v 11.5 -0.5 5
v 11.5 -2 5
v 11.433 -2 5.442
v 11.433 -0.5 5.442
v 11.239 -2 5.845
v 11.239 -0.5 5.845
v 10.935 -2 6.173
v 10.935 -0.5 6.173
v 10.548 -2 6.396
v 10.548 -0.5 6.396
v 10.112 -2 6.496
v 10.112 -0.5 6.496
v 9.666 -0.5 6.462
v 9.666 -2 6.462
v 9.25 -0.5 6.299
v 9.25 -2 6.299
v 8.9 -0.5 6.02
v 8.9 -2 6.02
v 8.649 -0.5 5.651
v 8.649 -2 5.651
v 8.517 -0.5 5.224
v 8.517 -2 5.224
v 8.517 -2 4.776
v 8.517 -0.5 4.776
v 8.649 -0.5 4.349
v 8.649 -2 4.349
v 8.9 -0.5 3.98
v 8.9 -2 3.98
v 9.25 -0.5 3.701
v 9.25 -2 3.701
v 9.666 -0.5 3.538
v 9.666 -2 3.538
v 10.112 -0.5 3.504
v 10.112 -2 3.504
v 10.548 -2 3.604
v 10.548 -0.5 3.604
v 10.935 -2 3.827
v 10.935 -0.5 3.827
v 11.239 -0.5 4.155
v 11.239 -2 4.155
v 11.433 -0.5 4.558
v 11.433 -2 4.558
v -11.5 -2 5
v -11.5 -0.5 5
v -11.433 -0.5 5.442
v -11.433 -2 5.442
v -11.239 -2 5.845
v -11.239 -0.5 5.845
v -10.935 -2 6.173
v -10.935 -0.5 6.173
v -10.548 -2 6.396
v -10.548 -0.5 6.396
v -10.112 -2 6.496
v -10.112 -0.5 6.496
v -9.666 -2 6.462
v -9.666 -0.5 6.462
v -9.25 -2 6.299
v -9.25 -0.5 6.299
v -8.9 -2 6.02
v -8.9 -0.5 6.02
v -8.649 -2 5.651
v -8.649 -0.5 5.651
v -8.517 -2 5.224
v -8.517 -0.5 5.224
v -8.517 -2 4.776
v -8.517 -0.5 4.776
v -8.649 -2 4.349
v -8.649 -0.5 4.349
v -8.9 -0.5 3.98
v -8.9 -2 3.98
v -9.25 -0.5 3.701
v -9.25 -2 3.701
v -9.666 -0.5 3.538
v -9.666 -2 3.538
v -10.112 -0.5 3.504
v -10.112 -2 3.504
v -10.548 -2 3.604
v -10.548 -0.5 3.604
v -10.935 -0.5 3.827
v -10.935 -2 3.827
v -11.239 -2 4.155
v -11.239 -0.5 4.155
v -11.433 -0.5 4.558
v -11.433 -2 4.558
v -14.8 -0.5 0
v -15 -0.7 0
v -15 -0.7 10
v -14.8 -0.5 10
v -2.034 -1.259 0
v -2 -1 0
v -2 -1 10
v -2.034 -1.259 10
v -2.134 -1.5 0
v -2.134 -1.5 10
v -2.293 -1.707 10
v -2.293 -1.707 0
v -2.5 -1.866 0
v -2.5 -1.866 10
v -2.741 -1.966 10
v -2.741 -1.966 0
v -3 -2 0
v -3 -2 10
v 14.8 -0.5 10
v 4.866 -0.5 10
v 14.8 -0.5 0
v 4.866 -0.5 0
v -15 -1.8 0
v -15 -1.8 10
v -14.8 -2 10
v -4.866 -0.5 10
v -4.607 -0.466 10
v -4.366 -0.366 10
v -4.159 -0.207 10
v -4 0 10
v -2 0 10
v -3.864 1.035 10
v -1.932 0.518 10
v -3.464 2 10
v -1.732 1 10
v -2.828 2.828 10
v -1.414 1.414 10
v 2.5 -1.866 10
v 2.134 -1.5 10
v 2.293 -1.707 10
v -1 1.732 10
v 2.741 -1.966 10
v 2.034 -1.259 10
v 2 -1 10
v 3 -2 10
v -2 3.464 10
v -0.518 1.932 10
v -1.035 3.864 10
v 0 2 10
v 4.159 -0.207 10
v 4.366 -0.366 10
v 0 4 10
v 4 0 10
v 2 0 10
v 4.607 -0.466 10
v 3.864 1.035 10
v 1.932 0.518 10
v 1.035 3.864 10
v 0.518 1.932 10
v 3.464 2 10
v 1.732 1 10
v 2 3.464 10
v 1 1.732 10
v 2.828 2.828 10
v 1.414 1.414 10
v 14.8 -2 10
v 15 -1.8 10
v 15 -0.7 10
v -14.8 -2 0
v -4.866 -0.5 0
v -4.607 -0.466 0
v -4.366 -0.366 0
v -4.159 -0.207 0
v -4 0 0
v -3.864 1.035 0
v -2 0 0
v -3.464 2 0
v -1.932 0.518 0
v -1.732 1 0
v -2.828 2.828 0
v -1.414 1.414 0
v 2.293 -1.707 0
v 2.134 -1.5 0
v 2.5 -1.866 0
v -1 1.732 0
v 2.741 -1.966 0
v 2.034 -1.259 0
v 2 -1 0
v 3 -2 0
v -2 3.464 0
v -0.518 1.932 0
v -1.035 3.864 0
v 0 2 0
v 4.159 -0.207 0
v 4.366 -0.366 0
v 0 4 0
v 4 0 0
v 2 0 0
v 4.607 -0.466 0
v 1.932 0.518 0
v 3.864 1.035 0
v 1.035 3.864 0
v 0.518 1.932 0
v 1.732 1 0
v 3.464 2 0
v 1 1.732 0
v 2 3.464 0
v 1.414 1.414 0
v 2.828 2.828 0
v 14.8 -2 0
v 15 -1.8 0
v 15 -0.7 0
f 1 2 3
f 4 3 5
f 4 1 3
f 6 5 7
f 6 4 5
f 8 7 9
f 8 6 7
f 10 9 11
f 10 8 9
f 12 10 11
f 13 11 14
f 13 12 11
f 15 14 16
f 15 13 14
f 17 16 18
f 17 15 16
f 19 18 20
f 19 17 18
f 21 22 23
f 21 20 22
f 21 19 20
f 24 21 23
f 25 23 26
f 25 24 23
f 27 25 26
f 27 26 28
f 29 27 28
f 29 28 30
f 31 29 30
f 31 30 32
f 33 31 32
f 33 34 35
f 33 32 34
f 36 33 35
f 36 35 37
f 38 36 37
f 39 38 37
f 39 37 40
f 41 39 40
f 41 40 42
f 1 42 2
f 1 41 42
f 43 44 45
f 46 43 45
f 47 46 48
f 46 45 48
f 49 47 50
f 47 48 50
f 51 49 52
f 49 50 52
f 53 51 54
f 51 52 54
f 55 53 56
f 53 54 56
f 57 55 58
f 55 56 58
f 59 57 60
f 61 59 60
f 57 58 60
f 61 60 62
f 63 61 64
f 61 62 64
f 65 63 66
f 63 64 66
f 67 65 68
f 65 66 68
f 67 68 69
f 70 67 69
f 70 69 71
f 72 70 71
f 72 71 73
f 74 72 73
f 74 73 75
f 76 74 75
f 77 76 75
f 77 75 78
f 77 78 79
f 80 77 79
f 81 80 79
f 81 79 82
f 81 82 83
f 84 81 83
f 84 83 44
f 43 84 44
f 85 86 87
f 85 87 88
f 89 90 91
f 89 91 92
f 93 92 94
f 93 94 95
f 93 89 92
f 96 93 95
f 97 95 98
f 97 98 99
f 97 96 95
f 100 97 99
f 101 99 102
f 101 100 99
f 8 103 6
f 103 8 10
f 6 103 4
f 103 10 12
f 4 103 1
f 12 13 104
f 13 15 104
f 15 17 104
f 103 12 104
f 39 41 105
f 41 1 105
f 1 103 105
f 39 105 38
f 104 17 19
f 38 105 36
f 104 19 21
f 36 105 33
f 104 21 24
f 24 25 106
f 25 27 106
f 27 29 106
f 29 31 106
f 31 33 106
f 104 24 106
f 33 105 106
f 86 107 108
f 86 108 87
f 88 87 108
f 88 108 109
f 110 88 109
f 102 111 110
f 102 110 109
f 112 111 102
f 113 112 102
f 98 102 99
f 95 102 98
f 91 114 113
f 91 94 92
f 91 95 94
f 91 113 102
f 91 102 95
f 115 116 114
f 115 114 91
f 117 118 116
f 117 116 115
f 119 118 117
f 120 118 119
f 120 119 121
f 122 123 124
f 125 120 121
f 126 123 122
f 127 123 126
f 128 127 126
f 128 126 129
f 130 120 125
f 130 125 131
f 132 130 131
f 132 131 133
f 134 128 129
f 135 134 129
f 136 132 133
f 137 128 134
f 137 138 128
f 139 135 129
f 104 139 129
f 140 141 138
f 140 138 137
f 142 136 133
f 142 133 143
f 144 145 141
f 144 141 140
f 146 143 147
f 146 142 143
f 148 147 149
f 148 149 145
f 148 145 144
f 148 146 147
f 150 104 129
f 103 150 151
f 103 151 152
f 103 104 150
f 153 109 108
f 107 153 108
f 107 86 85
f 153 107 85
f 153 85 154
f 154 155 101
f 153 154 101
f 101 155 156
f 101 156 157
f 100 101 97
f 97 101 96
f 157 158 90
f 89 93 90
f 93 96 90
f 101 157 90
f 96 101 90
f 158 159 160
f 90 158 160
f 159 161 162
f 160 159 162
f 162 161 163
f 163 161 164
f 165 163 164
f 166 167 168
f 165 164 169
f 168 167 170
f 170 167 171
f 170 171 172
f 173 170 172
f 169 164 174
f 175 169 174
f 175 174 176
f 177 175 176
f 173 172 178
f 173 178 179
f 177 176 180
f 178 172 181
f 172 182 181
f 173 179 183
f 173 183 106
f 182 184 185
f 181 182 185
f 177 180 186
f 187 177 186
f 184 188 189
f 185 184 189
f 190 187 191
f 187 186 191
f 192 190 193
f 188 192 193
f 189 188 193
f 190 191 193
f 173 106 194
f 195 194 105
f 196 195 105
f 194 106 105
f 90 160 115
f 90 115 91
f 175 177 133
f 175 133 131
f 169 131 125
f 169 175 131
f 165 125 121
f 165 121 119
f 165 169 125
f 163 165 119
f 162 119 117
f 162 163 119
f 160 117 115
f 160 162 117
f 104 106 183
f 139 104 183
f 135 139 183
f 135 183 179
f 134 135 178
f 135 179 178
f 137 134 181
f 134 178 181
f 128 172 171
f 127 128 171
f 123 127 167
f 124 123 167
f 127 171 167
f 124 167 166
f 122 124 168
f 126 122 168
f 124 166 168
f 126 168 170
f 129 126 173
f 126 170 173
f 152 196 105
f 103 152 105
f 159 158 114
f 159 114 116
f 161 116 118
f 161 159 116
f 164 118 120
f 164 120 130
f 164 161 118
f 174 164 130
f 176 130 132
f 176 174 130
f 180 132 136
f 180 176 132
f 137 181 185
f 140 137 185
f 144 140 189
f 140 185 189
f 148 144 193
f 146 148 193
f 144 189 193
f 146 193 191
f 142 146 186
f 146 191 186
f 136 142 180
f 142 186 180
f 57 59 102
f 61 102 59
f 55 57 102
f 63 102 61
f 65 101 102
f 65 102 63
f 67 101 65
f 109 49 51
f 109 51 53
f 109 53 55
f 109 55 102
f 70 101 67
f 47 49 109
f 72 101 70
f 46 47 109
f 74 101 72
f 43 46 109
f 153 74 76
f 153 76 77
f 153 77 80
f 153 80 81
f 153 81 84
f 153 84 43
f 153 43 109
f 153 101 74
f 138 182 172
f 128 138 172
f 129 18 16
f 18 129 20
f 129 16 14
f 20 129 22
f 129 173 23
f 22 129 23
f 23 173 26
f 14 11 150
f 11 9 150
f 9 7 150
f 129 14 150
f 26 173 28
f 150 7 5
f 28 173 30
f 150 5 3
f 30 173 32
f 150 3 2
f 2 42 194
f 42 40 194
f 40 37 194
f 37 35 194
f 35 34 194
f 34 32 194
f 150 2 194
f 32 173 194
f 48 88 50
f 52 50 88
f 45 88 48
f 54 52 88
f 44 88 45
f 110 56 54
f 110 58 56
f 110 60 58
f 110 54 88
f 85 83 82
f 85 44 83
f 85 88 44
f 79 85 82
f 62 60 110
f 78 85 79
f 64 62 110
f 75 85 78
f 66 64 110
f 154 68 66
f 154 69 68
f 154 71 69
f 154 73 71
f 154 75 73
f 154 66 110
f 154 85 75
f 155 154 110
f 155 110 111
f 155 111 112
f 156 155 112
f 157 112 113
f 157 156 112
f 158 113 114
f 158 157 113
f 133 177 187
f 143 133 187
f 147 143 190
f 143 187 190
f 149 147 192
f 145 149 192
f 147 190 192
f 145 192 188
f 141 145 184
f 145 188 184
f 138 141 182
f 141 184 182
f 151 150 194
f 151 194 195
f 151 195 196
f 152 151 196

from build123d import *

# Parameters (mm, degrees)
BOSS_EXTRUDE1_DEPTH = 10
SKETCH2_R           = 1.5
CUT_EXTRUDE1_DEPTH  = 30


with BuildPart() as part:
    # Sketch1 → Boss-Extrude1 (new body)
    with BuildSketch(Plane.XY):
        with BuildLine():
            Line((-3, -2), (-14.8, -2))
            Line((-14.8, -2), (-15, -1.8))
            Line((-15, -1.8), (-15, -0.7))
            Line((-15, -0.7), (-14.8, -0.5))
            Line((-14.8, -0.5), (-4.866025404, -0.5))
            ThreePointArc((-4.866025404, -0.5), (-4.366025404, -0.366025404), (-4, 0))
            ThreePointArc((-4, 0), (-2.828427125, 2.828427125), (0, 4))
            Line((0, 4), (0, 2))
            ThreePointArc((0, 2), (-1.414213562, 1.414213562), (-2, 0))
            Line((-2, 0), (-2, -1))
            ThreePointArc((-2, -1), (-2.292893219, -1.707106781), (-3, -2))
        make_face()
    boss_extrude1 = extrude(amount=BOSS_EXTRUDE1_DEPTH)

    # Sketch2 → Cut-Extrude1 (cut)
    with BuildSketch(Plane(origin=(0, -0.5, 0), x_dir=(1, 0, 0), z_dir=(0, 1, 0))):
        with Locations(Location((-10, -5, 0), (0, 0, 180))):
            Circle(SKETCH2_R)
    cut_extrude1 = extrude(amount=-CUT_EXTRUDE1_DEPTH, mode=Mode.SUBTRACT)

    # Mirror1: Boss-Extrude1, Cut-Extrude1 across plane
    add(boss_extrude1.mirror(Plane(origin=(0, 2, 10), x_dir=(0, 0, 1), z_dir=(-1, 0, 0))))
    add(cut_extrude1.mirror(Plane(origin=(0, 2, 10), x_dir=(0, 0, 1), z_dir=(-1, 0, 0))), mode=Mode.SUBTRACT)


solid = part.part
